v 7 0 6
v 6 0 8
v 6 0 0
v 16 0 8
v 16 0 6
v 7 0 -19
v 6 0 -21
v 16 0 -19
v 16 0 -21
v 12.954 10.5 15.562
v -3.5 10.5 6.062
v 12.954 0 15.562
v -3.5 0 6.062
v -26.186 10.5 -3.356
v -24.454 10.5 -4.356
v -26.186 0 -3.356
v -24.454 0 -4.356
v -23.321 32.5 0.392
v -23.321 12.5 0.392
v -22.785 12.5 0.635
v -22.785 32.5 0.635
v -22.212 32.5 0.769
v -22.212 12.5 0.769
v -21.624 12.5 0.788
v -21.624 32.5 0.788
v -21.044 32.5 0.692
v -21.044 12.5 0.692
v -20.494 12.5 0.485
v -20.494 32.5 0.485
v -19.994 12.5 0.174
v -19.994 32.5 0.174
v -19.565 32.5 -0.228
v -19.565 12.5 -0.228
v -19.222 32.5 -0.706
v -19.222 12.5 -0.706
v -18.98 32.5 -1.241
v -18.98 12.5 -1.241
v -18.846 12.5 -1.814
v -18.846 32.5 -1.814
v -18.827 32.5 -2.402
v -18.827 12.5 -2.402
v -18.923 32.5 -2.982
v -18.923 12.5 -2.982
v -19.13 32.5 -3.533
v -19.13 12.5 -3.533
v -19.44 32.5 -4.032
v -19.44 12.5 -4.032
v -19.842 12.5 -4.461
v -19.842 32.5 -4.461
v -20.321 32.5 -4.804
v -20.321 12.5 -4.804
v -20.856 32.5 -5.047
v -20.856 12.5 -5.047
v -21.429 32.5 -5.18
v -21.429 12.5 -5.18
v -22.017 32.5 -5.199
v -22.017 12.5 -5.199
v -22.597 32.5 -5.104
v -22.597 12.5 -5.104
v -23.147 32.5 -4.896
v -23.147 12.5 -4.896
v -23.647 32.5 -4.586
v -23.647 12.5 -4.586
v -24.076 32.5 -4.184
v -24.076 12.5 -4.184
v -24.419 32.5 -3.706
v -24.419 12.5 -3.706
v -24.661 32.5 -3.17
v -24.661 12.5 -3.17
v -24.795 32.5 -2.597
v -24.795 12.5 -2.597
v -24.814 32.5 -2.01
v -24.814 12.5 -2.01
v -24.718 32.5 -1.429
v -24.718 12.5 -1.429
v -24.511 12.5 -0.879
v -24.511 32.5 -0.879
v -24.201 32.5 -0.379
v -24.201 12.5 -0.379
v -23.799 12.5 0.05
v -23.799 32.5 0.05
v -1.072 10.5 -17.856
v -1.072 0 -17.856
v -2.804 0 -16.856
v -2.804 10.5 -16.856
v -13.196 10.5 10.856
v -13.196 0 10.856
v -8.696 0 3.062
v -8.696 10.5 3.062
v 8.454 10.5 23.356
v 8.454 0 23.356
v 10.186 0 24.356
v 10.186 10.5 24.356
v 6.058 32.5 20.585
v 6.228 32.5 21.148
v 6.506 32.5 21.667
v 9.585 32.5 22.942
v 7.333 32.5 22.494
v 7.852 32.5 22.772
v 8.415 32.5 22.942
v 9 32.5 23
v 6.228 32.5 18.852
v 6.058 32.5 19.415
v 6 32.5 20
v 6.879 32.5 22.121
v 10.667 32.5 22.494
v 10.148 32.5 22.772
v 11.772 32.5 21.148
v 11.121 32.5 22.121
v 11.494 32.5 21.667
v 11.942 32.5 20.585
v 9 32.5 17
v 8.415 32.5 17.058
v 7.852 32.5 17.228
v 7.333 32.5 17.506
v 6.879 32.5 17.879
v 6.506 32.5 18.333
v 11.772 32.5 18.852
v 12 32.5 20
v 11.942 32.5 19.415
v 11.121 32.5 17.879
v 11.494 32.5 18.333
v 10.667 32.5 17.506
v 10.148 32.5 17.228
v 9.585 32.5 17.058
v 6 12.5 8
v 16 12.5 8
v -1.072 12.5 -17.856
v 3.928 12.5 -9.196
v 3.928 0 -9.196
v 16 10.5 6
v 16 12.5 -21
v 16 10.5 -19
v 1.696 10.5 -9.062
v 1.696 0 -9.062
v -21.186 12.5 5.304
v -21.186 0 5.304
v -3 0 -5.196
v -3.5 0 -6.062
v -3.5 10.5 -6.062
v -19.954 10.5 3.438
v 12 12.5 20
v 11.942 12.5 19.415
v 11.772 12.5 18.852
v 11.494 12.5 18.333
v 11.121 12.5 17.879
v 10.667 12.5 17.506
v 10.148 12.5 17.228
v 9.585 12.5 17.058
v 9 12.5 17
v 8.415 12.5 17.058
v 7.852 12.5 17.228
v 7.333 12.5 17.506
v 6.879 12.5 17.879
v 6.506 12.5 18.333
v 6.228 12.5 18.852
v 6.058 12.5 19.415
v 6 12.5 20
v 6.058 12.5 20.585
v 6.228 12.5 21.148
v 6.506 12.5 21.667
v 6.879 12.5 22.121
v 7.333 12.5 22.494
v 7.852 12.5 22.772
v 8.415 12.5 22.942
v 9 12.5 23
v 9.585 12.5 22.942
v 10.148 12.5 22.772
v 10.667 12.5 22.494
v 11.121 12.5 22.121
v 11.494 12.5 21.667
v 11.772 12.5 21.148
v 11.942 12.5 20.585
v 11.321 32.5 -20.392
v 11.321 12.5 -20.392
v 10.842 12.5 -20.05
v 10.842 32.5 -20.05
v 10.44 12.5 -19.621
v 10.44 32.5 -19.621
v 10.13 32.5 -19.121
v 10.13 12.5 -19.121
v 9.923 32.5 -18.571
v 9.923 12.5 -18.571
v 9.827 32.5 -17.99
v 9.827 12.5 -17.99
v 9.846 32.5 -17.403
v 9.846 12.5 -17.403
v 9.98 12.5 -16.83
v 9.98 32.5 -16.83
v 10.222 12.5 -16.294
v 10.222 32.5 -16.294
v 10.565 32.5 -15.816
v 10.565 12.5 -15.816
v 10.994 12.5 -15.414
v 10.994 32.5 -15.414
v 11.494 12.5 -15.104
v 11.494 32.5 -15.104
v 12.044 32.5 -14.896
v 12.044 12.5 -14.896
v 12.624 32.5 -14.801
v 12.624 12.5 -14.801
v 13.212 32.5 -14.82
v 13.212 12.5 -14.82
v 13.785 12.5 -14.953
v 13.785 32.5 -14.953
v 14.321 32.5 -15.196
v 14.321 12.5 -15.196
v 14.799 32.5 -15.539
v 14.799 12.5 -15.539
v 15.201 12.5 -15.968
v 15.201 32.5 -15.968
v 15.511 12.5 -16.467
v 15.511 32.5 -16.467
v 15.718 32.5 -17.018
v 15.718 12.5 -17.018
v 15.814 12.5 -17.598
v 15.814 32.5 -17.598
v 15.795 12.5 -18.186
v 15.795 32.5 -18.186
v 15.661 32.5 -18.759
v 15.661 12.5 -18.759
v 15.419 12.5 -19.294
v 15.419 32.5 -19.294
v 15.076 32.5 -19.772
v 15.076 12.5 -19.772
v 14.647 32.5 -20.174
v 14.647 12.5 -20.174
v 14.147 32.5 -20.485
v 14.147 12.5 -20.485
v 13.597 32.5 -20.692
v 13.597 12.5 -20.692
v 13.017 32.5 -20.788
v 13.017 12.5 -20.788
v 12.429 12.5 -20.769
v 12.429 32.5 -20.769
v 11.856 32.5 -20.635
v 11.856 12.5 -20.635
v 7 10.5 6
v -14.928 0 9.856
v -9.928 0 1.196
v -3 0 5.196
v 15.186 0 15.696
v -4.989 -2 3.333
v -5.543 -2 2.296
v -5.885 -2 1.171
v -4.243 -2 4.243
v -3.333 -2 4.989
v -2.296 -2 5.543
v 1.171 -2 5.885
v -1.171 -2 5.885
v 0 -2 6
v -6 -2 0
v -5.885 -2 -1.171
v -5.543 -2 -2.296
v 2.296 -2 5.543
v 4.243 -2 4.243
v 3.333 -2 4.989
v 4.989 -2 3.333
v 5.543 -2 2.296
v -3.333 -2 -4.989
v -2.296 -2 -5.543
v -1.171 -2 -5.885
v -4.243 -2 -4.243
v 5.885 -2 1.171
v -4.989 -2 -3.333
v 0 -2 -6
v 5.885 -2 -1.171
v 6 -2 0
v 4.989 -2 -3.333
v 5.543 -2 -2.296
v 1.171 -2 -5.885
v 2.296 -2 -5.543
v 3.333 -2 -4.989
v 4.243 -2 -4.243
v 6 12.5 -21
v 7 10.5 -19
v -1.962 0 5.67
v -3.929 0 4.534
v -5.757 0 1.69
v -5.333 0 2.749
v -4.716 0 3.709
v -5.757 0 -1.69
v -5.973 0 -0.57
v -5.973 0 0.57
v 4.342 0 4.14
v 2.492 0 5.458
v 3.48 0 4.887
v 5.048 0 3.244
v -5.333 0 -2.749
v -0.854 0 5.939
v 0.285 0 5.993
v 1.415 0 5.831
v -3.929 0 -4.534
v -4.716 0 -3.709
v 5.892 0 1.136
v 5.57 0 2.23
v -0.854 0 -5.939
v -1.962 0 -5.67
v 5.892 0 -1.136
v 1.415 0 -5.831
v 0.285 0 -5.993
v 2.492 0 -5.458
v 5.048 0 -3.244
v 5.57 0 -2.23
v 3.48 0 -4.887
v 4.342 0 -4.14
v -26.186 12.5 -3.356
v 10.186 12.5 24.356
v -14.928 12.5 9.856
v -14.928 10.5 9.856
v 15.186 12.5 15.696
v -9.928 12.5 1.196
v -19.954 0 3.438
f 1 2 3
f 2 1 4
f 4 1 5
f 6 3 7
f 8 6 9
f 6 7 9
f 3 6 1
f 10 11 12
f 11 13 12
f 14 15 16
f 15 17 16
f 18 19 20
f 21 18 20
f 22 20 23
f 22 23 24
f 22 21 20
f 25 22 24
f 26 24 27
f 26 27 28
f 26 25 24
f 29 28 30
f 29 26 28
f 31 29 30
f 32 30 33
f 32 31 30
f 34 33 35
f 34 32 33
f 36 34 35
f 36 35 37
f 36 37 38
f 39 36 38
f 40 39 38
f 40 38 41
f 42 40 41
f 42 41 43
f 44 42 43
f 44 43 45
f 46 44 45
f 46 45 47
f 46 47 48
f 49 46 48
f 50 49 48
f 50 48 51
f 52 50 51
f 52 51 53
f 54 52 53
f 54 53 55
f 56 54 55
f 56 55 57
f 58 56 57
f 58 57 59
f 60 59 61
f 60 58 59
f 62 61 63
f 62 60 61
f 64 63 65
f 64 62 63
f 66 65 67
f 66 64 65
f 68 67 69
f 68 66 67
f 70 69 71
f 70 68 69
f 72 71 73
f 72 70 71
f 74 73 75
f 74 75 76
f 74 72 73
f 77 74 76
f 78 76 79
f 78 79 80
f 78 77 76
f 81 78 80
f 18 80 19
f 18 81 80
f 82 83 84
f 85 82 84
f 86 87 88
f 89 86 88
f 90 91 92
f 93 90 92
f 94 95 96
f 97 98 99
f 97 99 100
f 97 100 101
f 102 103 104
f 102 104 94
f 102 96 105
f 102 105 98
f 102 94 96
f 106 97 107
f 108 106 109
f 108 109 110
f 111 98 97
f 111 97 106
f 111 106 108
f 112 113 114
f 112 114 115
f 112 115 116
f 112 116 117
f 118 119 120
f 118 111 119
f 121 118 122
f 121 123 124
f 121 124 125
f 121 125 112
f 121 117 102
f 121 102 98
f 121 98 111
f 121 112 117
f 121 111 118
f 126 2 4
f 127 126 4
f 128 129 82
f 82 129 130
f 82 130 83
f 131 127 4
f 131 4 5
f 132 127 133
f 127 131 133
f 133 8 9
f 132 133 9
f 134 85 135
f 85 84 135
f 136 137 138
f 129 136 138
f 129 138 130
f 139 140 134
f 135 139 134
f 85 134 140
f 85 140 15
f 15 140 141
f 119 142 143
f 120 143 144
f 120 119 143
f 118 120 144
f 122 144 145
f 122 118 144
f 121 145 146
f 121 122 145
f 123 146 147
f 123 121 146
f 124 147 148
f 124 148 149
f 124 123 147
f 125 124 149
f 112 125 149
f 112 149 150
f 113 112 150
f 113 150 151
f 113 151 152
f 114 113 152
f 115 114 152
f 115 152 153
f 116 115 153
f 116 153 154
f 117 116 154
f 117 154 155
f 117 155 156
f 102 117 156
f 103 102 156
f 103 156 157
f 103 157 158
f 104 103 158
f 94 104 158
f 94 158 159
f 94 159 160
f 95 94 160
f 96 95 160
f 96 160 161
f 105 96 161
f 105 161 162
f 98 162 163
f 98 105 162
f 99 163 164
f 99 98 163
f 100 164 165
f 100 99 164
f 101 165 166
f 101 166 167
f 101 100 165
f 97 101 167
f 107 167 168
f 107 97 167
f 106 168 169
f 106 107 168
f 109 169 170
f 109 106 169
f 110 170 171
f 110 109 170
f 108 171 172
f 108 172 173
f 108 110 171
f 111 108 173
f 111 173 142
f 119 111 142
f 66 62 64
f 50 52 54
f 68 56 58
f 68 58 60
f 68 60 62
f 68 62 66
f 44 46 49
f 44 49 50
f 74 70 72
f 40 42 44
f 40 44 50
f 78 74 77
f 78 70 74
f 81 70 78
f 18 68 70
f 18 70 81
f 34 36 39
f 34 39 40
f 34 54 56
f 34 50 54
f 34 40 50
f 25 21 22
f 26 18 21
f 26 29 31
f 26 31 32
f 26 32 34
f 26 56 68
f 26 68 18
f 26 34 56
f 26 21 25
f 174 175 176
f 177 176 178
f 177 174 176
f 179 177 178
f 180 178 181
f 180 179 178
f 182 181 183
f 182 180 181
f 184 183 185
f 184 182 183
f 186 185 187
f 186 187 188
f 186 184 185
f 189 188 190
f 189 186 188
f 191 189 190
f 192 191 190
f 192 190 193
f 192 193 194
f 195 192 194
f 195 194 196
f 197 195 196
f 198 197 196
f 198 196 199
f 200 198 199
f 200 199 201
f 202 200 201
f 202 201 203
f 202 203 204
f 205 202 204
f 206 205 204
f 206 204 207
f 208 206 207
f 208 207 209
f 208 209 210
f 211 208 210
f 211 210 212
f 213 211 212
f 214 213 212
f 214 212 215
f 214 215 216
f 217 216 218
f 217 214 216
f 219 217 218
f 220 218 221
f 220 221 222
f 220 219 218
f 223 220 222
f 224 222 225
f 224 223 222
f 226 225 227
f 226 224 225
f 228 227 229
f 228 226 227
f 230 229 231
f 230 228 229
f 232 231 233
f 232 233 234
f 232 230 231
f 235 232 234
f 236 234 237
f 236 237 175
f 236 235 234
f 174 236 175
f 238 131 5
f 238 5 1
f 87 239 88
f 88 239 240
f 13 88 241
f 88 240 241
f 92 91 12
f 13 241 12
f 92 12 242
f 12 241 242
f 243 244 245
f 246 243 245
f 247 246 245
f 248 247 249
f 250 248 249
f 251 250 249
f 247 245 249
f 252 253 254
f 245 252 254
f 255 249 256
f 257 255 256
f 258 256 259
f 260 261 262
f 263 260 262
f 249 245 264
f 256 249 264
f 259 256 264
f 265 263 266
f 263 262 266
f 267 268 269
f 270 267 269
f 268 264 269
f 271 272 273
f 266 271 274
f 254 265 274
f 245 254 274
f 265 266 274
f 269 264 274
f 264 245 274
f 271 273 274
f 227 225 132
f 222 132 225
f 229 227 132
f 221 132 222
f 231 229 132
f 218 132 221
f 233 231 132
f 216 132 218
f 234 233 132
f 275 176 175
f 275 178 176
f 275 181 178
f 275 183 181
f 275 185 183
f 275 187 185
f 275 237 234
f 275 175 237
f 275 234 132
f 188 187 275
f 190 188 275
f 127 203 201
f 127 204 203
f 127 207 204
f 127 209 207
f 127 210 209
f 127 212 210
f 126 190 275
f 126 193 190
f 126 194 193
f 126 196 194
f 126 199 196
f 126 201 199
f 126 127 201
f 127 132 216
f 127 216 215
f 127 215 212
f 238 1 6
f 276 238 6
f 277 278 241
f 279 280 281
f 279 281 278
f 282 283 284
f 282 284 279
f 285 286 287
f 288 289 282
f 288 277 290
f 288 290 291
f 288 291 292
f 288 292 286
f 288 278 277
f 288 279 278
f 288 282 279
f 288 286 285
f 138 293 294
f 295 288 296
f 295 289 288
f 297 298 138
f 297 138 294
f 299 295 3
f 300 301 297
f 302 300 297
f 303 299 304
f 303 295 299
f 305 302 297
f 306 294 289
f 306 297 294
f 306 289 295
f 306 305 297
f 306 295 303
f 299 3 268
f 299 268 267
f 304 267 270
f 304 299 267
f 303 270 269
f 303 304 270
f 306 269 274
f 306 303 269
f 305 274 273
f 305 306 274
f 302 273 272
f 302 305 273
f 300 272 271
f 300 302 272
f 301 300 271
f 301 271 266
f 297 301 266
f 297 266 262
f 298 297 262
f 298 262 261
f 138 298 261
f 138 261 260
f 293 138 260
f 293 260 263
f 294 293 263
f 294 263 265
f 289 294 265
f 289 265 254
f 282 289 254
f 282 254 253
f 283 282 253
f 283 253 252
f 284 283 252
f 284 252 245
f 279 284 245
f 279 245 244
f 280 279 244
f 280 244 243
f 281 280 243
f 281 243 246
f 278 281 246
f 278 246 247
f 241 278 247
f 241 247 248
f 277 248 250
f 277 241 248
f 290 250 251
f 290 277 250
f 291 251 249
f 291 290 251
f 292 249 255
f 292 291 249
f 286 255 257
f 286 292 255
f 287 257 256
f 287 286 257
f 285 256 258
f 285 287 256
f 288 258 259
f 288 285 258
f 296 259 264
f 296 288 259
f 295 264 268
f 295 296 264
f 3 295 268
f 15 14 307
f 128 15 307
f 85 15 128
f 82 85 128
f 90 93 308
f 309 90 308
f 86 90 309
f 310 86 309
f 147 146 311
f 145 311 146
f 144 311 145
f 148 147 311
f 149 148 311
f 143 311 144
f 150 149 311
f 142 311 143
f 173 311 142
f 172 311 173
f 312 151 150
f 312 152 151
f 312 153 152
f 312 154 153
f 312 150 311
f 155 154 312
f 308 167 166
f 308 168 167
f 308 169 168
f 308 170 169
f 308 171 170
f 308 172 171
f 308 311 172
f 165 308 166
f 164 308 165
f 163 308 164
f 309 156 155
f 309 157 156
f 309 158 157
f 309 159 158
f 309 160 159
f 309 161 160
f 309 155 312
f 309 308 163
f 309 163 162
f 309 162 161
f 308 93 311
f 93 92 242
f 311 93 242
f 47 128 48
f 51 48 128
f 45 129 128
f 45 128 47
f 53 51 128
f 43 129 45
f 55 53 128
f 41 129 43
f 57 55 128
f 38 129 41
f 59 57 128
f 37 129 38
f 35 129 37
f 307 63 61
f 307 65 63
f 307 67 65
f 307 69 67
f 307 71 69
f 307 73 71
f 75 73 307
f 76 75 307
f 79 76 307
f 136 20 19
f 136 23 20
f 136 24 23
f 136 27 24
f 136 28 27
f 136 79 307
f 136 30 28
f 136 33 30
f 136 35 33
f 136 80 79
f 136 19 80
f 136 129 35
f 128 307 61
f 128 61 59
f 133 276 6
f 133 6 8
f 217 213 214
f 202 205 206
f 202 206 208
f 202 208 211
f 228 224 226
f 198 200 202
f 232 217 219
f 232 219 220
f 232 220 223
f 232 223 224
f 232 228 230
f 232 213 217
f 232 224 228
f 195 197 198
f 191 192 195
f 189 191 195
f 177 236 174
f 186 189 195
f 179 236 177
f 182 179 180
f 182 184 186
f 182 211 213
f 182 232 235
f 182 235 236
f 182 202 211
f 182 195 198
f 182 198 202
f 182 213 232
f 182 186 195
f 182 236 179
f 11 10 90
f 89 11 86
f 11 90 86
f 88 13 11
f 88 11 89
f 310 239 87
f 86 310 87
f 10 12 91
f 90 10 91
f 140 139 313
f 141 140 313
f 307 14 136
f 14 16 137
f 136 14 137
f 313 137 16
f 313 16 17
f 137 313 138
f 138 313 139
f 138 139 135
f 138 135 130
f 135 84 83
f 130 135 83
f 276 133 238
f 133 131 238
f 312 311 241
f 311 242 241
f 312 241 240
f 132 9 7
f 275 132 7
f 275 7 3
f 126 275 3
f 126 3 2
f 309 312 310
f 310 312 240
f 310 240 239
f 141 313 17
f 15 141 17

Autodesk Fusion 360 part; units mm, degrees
sketch "草图1" plane through (0, 0, 0) normal (0, 1, 0) x (1, 0, 0)
  circle A0 centre (0, 0) radius 6
  line L0 (7, 0) -> (7, -6)
  line L1 (7, 0) -> (7, 19)
  line L2 (7, 19) -> (16, 19)
  line L3 (16, 19) -> (16, 21)
  line L4 (16, 21) -> (6, 21)
  line L5 (6, 21) -> (6, -8)
  line L6 (6, -8) -> (16, -8)
  line L7 (16, -8) -> (16, -6)
  line L8 (16, -6) -> (7, -6)
  line L9 (-24.4545, 4.3564) -> (-26.1865, 3.3564)
  line L10 (-26.1865, 3.3564) -> (-21.1865, -5.3038)
  line L11 (-19.9545, -3.4378) -> (-24.4545, 4.3564)
  line L12 (-2.8038, 16.8564) -> (1.6962, 9.0622)
  line L13 (-1.0718, 17.8564) -> (-2.8038, 16.8564)
  line L14 (-3.5, 6.0622) -> (1.6962, 9.0622)
  line L15 (3.9282, 9.1962) -> (-1.0718, 17.8564)
  line L16 (-3.5, 6.0622) -> (-19.9545, -3.4378)
  line L17 (-21.1865, -5.3038) -> (3.9282, 9.1962)
  line L18 (8.4545, -23.3564) -> (10.1865, -24.3564)
  line L19 (10.1865, -24.3564) -> (15.1865, -15.6962)
  line L20 (12.9545, -15.5622) -> (8.4545, -23.3564)
  line L21 (-13.1962, -10.8564) -> (-8.6962, -3.0622)
  line L22 (-14.9282, -9.8564) -> (-13.1962, -10.8564)
  line L23 (-3.5, -6.0622) -> (-8.6962, -3.0622)
  line L24 (-9.9282, -1.1962) -> (-14.9282, -9.8564)
  line L25 (-3.5, -6.0622) -> (12.9545, -15.5622)
  line L26 (15.1865, -15.6962) -> (-9.9282, -1.1962)
  dimension "d1" = 12
  dimension "d2" = 6
  dimension "d3" = 19
  dimension "d5" = 360
sketch "草图2" plane through (0, 0, 0) normal (0, 1, 0) x (1, 0, 0)
  circle A0 centre (0, 0) radius 6
  line L0 (16, 21) -> (0, 21)
  line L1 (16, 21) -> (16, -15)
  line L2 (-26.1865, 3.3564) -> (-18.1865, -10.5)
  line L3 (-26.1865, 3.3564) -> (4.9904, 21.3564)
  line L4 (10.1865, -24.3564) -> (18.1865, -10.5)
  line L5 (10.1865, -24.3564) -> (-20.9904, -6.3564)
  dimension "d11" = 360
extrude "拉伸1" add sketch "草图2" against normal blind 2 contours A0
extrude "拉伸2" add sketch "草图1" along normal blind 10.5 contours L18 L19 L20 L21 L22 L23 L24 L25 L26 | L9 L10 L11 L12 L13 L14 L15 L16 L17 | L0 L1 L2 L3 L4 L5 L6 L7 L8
sketch "草图3" plane through (0, 10.5, 0) normal (0, 1, 0) x (-1, 0, 0)
  line L0 (-7, 6) -> (-7, -19)
  line L1 (-7, -19) -> (-16, -19)
  line L2 (-16, -19) -> (-16, -21)
  line L3 (-16, -21) -> (-6, -21)
  line L4 (-6, -21) -> (-6, 8)
  line L5 (-6, 8) -> (-16, 8)
  line L6 (-16, 8) -> (-16, 6)
  line L7 (-16, 6) -> (-7, 6)
  line L8 (-6, -21) -> (-16, -21)
  line L9 (-16, -21) -> (-16, 8)
  line L10 (-16, 8) -> (-6, 8)
  line L11 (-6, 8) -> (-6, -21)
  line L12 (21.1865, 5.3038) -> (26.1865, -3.3564)
  line L13 (-3.9282, -9.1962) -> (21.1865, 5.3038)
  line L14 (26.1865, -3.3564) -> (1.0718, -17.8564)
  line L15 (1.0718, -17.8564) -> (-3.9282, -9.1962)
  line L16 (-15.1865, 15.6962) -> (-10.1865, 24.3564)
  line L17 (9.9282, 1.1962) -> (-15.1865, 15.6962)
  line L18 (-10.1865, 24.3564) -> (14.9282, 9.8564)
  line L19 (14.9282, 9.8564) -> (9.9282, 1.1962)
  dimension "d13" = 360
extrude "拉伸3" add sketch "草图3" along normal blind 2
cylinder "圆柱体基本要素1" add diameter 6 height 20 placed x (1, 0, 0) y (0, 0, -1) z (0, 1, 0) at (9, 12.5, 20)
pattern_circular "C-阵列1" count 3 over 360 about axis through (0, 1.75, 0) along (0, 1, 0) of "圆柱体基本要素1"
